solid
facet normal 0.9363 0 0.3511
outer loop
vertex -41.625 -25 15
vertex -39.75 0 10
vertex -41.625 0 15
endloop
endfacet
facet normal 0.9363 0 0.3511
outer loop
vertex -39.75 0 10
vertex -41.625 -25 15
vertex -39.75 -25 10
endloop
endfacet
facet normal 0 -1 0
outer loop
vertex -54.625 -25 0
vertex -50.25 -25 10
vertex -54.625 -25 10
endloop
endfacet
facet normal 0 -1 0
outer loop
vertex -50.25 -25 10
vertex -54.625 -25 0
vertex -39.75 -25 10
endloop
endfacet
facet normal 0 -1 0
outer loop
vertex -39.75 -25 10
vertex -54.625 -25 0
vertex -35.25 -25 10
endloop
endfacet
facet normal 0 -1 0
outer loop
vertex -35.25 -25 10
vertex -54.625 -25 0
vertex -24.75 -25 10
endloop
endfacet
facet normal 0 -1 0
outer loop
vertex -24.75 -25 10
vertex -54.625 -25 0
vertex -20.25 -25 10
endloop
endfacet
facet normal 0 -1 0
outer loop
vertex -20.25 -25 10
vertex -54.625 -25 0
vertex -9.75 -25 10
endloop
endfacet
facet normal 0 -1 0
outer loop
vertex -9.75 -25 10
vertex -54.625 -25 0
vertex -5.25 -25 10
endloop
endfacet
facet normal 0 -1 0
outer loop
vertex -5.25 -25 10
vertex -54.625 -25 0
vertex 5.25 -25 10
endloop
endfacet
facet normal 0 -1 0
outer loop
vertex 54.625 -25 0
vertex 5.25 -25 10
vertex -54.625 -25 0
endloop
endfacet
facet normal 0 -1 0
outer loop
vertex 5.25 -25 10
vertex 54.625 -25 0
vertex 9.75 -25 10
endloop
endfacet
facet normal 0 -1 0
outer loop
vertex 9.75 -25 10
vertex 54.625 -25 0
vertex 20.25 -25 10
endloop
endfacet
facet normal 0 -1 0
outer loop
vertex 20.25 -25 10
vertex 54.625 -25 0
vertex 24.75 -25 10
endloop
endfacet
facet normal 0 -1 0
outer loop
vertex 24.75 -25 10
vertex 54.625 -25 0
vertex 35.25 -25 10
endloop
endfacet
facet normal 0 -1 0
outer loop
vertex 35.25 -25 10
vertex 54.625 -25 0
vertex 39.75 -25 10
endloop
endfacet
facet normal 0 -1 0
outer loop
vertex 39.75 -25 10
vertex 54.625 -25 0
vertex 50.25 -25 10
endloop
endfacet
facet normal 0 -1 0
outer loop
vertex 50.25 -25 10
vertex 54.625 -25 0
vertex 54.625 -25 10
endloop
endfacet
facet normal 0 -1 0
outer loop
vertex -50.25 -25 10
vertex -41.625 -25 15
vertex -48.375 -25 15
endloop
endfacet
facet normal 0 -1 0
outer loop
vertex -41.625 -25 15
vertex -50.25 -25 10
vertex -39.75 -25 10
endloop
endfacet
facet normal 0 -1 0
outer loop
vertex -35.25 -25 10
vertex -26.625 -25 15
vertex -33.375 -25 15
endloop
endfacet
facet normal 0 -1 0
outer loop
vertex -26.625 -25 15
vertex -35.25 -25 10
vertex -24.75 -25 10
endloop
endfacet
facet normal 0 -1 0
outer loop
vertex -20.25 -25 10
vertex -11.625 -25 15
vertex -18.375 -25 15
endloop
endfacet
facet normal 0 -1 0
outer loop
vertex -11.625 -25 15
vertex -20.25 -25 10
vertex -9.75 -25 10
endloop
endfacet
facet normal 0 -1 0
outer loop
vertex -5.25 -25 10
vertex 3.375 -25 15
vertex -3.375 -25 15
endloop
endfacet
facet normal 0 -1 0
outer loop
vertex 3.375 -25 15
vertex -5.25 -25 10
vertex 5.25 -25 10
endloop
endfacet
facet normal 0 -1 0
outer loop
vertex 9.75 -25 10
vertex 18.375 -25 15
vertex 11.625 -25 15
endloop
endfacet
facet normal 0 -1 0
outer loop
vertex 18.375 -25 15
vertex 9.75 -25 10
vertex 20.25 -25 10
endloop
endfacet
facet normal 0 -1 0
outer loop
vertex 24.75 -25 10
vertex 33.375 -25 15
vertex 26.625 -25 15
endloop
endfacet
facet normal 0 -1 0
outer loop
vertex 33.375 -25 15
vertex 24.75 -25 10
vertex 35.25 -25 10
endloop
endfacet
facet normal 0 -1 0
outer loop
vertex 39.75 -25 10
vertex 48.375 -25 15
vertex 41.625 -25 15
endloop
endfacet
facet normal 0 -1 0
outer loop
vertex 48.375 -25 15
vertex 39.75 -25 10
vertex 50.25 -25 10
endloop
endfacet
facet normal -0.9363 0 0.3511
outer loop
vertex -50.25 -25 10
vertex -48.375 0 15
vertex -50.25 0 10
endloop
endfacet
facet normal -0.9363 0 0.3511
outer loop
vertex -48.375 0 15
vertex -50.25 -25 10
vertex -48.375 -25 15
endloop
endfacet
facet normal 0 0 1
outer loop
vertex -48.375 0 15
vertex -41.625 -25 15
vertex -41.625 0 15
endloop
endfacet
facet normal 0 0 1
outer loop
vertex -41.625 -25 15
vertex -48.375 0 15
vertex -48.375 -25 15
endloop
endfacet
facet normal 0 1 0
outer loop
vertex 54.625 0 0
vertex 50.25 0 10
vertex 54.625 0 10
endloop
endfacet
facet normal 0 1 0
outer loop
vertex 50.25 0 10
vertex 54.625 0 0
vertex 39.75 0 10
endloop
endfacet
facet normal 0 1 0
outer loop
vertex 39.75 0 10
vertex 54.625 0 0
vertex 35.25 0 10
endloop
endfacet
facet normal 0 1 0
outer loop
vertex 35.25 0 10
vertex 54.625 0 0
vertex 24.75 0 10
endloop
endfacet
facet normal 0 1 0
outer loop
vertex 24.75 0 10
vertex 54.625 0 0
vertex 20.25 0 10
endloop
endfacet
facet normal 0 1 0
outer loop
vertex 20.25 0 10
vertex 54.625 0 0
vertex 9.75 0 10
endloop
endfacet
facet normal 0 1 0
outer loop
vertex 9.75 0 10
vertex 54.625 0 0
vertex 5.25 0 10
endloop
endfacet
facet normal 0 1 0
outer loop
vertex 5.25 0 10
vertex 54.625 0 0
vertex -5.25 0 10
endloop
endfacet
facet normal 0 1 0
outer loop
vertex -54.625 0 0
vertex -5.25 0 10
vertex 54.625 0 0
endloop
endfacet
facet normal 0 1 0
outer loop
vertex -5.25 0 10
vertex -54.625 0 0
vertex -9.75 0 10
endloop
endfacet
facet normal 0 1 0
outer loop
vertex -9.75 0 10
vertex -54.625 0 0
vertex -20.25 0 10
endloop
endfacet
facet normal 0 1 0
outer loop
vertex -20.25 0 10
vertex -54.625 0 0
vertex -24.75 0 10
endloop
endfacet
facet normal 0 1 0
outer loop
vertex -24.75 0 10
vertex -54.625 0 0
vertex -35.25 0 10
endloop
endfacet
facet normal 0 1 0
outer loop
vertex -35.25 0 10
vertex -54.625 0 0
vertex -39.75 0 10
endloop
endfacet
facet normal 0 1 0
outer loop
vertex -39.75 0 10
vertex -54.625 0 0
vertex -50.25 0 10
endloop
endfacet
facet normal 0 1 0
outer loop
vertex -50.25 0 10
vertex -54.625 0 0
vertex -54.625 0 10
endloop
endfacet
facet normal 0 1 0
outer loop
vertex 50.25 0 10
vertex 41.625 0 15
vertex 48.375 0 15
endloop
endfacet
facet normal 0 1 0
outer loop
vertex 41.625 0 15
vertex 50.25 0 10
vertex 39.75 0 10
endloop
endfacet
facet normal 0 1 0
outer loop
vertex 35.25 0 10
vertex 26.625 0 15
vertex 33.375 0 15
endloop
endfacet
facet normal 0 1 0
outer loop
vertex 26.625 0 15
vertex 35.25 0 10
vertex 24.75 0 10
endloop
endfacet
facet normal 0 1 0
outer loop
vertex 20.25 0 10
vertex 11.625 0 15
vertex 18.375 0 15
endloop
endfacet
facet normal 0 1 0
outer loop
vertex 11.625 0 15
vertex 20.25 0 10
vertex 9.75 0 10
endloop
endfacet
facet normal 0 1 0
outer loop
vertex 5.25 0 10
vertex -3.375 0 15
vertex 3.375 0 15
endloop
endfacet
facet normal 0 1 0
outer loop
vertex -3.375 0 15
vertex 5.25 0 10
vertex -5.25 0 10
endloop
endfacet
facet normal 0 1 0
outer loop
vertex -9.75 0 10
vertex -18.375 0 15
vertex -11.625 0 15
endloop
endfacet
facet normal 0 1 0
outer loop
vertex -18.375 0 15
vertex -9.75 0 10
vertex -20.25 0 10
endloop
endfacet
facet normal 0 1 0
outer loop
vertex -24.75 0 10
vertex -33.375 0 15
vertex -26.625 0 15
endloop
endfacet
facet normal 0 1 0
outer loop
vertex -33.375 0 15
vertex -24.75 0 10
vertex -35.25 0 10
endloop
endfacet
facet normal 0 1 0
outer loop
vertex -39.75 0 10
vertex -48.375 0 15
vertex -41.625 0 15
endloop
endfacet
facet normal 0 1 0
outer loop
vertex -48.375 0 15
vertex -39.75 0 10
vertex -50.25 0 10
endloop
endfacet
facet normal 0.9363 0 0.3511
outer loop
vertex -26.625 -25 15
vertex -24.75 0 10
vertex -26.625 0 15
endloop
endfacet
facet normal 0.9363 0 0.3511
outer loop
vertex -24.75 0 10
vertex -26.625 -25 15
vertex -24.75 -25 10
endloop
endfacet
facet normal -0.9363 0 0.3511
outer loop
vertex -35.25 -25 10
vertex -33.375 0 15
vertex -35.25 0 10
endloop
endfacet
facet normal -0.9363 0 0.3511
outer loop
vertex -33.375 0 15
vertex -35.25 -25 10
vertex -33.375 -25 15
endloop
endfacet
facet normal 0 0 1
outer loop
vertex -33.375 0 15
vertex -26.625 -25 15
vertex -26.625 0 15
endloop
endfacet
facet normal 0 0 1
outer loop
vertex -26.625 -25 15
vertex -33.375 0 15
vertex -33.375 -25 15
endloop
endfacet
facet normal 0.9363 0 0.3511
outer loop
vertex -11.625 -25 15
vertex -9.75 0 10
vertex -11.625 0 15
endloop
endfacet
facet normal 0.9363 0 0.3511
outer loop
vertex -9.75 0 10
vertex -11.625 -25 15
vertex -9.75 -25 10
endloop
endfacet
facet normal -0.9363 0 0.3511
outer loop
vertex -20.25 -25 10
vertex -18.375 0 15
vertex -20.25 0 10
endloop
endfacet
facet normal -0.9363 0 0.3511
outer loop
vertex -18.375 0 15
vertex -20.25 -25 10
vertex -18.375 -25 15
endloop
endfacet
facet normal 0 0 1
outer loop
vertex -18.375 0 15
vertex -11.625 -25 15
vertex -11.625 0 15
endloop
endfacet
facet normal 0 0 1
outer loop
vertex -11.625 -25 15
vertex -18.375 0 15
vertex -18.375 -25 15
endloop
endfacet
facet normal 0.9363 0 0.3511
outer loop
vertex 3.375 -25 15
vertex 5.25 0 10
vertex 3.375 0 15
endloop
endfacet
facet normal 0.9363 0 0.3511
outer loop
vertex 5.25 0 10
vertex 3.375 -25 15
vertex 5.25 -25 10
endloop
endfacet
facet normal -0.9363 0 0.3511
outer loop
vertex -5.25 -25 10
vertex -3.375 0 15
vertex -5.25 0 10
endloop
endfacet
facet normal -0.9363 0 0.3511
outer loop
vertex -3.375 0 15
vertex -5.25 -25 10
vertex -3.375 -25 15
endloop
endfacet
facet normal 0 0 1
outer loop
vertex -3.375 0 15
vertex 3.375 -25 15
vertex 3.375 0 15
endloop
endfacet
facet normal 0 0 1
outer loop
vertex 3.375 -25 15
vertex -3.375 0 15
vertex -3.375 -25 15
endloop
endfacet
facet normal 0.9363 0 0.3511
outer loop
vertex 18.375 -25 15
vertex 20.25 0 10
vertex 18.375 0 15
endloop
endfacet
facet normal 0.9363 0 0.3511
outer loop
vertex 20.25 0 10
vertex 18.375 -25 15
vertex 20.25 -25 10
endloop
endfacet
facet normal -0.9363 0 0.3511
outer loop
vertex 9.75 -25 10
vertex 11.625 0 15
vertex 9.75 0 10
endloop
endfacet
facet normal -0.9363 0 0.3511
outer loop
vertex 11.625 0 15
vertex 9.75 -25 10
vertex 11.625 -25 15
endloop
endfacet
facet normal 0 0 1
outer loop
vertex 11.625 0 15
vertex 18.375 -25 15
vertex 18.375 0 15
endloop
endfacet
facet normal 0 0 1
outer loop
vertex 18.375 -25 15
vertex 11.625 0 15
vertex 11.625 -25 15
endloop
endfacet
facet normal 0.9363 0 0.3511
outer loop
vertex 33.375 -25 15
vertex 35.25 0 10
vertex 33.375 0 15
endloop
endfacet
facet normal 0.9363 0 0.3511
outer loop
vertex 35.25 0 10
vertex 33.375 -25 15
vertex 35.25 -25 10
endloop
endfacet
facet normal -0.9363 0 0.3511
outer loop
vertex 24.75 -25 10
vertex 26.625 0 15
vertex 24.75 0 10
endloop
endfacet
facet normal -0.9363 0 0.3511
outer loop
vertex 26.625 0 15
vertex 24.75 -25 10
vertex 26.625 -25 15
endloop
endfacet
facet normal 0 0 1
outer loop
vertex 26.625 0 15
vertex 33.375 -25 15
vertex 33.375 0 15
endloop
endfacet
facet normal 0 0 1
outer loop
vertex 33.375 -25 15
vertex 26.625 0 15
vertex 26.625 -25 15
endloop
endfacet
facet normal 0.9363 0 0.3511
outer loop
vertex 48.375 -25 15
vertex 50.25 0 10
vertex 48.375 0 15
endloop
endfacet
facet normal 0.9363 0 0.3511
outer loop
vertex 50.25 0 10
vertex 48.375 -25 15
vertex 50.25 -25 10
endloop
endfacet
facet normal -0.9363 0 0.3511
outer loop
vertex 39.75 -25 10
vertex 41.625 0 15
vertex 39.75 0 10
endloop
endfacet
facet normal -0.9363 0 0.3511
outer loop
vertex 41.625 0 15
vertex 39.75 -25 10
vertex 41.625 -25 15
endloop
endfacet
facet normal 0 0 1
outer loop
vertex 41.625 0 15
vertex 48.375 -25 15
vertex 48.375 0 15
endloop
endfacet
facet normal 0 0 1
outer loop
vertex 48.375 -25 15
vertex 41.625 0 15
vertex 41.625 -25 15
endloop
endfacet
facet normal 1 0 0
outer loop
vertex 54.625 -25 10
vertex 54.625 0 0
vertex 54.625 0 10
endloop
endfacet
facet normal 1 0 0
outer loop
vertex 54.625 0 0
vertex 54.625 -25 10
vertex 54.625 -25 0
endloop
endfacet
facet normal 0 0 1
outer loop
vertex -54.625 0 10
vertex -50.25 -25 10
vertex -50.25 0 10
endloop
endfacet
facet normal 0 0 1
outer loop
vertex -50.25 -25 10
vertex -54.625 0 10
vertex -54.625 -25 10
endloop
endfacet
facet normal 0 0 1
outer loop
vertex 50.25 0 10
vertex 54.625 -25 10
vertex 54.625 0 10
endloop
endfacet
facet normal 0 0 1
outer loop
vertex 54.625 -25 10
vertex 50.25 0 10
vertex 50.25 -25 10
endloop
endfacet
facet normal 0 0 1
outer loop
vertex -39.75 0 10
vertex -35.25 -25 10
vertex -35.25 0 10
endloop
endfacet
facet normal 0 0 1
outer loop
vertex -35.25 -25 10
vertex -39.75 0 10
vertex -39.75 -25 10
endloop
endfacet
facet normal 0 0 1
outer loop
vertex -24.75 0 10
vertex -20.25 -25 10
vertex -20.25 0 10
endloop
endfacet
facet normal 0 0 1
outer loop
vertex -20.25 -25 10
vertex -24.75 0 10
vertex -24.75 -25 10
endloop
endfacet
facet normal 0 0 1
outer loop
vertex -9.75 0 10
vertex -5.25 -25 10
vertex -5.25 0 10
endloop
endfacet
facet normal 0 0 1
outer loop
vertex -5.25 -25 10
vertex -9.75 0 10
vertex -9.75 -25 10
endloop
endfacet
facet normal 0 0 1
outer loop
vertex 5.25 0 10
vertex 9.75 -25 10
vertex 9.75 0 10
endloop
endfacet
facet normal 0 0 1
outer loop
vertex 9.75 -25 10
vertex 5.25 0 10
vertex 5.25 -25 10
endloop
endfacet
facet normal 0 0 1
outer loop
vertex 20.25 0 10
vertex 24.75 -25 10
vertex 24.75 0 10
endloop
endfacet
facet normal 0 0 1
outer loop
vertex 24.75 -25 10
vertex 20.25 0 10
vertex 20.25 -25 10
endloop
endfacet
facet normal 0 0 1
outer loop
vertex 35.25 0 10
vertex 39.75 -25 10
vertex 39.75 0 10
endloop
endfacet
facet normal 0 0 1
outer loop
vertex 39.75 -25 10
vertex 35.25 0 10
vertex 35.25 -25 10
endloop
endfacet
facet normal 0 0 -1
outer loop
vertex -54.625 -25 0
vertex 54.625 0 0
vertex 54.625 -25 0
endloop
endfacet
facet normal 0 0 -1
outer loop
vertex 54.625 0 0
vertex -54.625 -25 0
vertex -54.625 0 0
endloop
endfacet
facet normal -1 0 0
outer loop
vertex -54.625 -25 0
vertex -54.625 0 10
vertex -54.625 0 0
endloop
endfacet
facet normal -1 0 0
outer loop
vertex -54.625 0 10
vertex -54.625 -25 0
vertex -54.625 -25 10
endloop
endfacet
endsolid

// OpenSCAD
$fn = 32;

// ----------------------------------------------------------------------
// Toothed rack, 7 teeth
// 15 mm pitch, 5 mm teeth
// ----------------------------------------------------------------------

// --- parameters (mm) ---
bar_w = 25;      // bar width (Y)
bar_h = 10;      // bar height (Z)
teeth = 7;       // number of teeth
pitch = 15;      // tooth pitch
tooth_h = 5;     // tooth height above the bar
root_w = 11.25;  // tooth width at the root
crest_w = 6.75;  // tooth width at the crest

// --- derived feature positions (mm) ---
span = (teeth - 1) * pitch;  // = 90   distance between the outer teeth
bar_l = span + root_w + 8;   // = 109.25   bar length: teeth plus 4 mm at each end
tooth_x = -span / 2;         // = -45   X of the first tooth
height = bar_h + tooth_h;    // = 15   overall height
feature_centers = [
  [tooth_x + 0 * pitch, -bar_w / 2],
  [tooth_x + 1 * pitch, -bar_w / 2],
  [tooth_x + 2 * pitch, -bar_w / 2],
  [tooth_x + 3 * pitch, -bar_w / 2],
  [tooth_x + 4 * pitch, -bar_w / 2],
  [tooth_x + 5 * pitch, -bar_w / 2],
  [tooth_x + 6 * pitch, -bar_w / 2]
];   // tooth centre line, drives the tooth loop

// bar with a rack of teeth, one extruded trapezoium per centre
module rack_tooth() {
  linear_extrude(height = bar_w)
    polygon(points = [
      [0, 0],
      [root_w, 0],
      [root_w / 2 + crest_w / 2, tooth_h + 1],
      [root_w / 2 - crest_w / 2, tooth_h + 1]
    ]);
}

union() {
  translate([-bar_l / 2, -bar_w, 0]) cube([bar_l, bar_w, bar_h]);
  for (centre = feature_centers)
    translate([centre[0] - root_w / 2, 0, bar_h - 1]) rotate([90, 0, 0]) rack_tooth();
}
